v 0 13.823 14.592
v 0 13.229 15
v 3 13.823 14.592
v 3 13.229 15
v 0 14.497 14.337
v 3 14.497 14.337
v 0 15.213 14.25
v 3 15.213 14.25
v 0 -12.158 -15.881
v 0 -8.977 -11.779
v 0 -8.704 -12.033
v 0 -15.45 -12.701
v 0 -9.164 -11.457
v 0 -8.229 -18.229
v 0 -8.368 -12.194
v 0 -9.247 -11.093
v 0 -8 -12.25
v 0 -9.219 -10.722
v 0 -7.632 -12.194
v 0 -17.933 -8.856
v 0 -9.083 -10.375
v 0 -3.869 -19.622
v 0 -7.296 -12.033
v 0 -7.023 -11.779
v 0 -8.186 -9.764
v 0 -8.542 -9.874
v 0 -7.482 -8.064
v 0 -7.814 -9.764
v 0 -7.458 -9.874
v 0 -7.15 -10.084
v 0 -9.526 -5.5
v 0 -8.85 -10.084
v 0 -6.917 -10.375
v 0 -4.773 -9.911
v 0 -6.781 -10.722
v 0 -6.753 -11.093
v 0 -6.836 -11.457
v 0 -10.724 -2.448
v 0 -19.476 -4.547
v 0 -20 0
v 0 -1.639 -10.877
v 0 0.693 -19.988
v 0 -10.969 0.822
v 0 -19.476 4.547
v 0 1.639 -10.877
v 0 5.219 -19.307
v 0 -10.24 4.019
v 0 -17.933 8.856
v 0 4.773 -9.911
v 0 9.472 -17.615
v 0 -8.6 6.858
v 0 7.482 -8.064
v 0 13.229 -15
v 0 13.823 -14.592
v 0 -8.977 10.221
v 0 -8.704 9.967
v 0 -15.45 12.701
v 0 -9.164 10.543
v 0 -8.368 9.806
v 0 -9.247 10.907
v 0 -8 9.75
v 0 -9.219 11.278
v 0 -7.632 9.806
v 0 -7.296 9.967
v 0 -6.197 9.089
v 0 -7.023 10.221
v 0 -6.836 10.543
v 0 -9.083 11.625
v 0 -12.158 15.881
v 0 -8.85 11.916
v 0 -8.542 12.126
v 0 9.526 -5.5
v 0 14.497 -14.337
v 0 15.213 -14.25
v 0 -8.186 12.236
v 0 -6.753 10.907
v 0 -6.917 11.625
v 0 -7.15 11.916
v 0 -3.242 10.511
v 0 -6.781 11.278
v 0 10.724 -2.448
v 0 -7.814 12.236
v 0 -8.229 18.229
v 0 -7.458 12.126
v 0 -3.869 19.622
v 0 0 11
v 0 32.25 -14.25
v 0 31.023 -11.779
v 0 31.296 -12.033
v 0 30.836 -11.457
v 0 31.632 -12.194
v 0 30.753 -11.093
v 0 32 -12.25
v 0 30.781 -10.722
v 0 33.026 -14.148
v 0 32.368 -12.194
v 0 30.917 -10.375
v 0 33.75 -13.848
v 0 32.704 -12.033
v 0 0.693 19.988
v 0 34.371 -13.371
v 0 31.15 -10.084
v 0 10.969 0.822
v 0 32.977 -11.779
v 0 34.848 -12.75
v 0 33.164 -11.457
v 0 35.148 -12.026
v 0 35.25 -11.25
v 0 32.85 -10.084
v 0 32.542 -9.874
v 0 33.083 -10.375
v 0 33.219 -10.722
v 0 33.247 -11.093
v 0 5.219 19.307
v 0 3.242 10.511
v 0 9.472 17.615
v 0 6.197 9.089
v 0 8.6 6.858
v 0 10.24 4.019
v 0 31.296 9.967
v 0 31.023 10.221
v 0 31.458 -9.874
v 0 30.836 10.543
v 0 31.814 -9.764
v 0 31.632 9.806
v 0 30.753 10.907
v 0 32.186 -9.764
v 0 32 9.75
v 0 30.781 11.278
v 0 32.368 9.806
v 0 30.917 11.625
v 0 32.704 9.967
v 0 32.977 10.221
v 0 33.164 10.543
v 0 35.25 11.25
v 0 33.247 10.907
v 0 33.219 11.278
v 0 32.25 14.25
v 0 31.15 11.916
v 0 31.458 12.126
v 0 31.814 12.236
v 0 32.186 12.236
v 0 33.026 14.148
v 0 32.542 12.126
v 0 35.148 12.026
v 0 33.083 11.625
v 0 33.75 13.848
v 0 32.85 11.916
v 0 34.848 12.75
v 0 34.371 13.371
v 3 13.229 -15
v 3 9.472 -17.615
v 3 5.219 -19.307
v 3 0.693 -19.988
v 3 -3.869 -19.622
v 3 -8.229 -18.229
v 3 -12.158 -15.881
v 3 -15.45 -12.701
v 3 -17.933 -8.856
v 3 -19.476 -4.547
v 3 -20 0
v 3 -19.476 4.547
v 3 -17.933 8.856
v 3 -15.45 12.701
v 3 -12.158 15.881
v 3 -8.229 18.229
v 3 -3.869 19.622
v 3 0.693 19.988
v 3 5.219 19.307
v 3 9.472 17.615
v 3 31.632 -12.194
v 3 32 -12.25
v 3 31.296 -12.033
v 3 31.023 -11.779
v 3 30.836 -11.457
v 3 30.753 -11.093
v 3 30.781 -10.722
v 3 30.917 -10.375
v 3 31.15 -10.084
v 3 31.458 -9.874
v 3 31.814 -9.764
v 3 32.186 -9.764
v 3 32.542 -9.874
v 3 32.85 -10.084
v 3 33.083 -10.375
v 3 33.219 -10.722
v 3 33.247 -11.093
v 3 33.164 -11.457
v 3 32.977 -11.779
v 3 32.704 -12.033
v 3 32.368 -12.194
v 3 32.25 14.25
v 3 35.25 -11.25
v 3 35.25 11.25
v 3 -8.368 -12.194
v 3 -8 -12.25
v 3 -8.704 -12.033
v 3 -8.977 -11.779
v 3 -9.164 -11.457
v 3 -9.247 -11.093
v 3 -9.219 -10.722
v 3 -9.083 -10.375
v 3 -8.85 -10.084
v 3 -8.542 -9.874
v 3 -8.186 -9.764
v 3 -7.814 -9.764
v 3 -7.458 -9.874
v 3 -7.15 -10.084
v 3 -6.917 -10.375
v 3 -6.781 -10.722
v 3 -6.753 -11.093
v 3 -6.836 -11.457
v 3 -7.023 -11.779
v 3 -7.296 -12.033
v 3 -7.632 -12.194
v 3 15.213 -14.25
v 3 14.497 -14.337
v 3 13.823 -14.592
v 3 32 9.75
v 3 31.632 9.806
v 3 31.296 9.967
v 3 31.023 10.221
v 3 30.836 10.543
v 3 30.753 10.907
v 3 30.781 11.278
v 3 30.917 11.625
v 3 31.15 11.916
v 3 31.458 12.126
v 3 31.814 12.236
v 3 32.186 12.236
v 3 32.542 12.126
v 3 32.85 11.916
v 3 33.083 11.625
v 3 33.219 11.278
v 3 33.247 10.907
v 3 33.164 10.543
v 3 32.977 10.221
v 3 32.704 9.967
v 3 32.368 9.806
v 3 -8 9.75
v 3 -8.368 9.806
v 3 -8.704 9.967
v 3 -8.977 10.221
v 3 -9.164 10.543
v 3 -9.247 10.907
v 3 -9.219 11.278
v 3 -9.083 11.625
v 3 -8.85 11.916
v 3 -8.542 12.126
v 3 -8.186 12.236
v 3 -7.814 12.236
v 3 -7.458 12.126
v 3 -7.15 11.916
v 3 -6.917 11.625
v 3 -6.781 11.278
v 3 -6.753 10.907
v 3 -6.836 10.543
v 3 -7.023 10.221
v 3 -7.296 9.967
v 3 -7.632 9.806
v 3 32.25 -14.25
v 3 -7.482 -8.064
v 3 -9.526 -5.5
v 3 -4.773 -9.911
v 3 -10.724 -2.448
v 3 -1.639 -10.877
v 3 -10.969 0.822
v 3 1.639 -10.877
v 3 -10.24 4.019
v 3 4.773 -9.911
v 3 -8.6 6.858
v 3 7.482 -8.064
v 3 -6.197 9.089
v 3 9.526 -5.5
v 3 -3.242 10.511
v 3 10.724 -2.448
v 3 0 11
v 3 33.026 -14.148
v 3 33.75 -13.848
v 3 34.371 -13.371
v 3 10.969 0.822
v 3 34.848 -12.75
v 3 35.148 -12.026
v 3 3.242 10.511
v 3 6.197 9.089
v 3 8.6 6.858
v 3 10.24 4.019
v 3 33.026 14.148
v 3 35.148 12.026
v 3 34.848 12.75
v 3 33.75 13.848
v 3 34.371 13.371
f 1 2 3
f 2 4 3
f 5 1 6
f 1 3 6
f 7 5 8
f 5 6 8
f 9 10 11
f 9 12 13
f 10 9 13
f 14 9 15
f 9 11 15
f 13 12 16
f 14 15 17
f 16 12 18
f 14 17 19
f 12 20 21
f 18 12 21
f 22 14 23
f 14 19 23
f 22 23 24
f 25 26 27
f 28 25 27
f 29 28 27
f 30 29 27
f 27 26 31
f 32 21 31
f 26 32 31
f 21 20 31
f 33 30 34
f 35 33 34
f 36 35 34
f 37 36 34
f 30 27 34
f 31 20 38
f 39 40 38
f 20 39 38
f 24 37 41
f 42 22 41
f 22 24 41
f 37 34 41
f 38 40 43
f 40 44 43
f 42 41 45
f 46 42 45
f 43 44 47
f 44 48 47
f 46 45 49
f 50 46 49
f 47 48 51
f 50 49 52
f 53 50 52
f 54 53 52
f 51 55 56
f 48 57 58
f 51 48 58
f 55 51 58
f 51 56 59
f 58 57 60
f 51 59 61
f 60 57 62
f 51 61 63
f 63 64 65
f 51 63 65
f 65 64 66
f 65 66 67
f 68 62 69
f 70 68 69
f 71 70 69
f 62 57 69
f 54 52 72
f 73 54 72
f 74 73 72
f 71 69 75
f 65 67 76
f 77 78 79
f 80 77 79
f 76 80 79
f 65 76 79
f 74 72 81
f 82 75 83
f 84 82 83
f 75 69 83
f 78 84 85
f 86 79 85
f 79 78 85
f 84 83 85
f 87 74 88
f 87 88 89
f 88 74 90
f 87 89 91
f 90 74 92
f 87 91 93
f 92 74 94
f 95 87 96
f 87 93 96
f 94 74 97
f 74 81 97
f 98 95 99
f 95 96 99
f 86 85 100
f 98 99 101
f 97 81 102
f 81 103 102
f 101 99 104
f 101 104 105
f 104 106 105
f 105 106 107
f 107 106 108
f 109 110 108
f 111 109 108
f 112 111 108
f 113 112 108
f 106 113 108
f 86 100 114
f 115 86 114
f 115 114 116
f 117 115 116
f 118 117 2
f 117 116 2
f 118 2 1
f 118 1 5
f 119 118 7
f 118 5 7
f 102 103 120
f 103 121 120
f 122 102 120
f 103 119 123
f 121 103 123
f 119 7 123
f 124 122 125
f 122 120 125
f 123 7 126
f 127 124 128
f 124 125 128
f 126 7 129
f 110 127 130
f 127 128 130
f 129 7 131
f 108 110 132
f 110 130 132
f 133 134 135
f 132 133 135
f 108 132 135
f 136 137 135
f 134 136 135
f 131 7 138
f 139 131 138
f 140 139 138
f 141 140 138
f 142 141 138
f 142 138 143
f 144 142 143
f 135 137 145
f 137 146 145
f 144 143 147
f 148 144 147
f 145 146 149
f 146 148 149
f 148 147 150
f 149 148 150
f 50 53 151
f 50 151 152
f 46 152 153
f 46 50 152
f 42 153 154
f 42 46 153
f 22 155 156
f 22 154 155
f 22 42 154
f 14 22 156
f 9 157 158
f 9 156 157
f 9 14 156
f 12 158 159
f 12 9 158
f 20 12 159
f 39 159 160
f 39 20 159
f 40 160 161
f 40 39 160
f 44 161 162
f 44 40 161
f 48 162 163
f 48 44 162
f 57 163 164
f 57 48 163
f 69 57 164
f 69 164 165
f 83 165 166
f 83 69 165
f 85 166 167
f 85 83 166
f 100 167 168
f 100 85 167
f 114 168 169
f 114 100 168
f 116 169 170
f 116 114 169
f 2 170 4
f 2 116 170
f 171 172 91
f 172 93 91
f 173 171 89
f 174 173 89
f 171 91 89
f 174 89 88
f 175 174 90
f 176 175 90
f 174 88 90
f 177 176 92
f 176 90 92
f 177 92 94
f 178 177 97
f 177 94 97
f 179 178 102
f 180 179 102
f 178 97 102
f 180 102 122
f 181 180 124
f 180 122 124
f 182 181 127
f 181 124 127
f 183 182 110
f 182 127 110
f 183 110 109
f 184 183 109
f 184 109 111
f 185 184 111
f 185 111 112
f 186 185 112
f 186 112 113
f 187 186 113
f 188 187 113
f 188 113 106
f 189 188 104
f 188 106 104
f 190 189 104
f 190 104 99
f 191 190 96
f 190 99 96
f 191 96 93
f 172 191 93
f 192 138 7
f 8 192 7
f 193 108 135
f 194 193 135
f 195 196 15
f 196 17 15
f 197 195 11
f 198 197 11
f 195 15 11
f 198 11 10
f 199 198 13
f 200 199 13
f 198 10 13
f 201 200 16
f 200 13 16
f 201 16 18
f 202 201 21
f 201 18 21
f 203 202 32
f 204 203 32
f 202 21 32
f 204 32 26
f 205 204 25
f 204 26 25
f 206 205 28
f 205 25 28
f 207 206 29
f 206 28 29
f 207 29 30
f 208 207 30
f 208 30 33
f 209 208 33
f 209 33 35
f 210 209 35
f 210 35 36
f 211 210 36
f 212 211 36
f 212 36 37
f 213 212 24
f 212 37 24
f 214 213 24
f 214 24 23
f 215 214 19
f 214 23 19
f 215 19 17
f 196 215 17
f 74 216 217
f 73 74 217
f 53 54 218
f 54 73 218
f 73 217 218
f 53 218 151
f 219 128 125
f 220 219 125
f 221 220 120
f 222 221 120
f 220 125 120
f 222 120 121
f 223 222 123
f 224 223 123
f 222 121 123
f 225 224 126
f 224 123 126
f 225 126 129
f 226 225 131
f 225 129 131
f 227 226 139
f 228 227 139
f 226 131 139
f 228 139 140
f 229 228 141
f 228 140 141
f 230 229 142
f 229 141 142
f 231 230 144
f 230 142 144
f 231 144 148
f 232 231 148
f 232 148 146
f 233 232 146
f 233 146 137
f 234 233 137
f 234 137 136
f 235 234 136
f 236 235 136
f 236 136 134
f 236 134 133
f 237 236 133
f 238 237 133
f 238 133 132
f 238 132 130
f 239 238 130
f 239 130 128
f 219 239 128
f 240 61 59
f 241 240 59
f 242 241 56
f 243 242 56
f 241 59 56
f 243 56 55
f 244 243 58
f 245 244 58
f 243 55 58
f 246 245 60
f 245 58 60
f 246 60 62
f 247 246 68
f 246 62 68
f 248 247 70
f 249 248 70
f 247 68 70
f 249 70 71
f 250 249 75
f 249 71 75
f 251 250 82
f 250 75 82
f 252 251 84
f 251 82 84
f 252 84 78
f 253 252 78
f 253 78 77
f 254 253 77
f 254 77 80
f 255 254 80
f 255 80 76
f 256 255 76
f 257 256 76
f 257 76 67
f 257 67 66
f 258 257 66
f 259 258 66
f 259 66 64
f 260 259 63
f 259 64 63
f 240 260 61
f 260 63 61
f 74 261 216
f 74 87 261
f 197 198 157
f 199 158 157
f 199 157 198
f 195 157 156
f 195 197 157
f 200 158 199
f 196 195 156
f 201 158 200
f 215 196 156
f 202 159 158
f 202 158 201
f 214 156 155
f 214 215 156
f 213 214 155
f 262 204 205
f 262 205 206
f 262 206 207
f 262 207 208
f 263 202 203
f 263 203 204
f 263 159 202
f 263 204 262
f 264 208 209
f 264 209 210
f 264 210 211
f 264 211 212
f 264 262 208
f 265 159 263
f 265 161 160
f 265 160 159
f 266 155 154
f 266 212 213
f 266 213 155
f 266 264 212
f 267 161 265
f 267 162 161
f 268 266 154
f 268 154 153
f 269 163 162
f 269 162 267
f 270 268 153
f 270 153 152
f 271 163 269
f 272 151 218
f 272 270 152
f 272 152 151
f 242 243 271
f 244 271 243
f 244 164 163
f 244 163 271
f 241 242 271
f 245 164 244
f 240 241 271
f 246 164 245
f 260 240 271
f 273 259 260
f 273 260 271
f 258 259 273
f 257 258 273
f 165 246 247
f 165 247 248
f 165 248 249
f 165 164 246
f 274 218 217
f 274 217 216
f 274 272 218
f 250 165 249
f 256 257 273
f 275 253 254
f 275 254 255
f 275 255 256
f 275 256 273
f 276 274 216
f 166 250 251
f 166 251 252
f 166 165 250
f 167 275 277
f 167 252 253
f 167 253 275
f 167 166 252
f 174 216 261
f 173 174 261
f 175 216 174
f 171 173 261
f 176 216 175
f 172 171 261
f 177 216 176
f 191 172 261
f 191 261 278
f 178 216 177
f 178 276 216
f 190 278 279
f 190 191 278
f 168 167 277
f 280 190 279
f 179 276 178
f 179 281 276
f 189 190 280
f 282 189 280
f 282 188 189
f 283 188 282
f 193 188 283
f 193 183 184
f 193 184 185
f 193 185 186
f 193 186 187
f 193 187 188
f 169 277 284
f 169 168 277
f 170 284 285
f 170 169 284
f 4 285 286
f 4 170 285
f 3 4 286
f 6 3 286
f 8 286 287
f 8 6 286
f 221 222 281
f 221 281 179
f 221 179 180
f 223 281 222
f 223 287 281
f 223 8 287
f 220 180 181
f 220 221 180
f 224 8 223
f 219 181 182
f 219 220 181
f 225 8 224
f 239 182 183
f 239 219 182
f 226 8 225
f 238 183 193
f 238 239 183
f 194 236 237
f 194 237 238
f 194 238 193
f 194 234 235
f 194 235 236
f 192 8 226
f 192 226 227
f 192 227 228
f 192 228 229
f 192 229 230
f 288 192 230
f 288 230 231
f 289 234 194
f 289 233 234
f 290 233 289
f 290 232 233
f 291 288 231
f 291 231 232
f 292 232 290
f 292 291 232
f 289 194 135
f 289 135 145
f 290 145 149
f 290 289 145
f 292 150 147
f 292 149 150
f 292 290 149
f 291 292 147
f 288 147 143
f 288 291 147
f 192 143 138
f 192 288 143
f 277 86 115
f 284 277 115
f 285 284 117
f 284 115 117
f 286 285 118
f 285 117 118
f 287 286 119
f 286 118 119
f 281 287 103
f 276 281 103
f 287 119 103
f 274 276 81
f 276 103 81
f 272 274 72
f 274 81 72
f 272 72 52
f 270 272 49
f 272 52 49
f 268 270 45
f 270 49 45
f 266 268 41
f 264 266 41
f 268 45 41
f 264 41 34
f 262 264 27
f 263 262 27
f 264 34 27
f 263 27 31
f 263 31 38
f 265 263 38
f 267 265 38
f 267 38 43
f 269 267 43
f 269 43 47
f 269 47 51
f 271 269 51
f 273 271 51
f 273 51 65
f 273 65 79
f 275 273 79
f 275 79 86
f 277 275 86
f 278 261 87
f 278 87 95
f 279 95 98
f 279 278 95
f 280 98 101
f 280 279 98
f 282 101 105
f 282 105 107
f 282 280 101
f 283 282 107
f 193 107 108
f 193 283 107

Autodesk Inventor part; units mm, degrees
ref_plane "YZ Plane" through (0, 0, 0) normal (1, 0, 0) x (0, 1, 0)
ref_plane "XZ Plane" through (0, 0, 0) normal (0, 1, 0) x (-1, 0, 0)
ref_plane "XY Plane" through (0, 0, 0) normal (0, 0, 1) x (1, 0, 0)
sketch "スケッチ1" plane through (0, 0, 0) normal (1, 0, 0) x (0, 1, 0)
  circle A0 centre (0, 0) radius 20
  line L0 (0, 0) -> (35.25, 0)
  line L1 (35.25, 0) -> (35.25, -14.25)
  line L2 (35.25, -14.25) -> (0, -14.25)
  line L3 (0, -14.25) -> (0, 0)
  line L4 (35.25, 0) -> (35.25, 14.25)
  line L5 (35.25, 14.25) -> (0, 14.25)
  point P0 (14.0334, 14.25)
  point P1 (14.0334, -14.25)
  dimension "d0" = 40
  dimension "d1" = 14.25
  dimension "d2" = 35.25
extrude "押し出し1" add sketch "スケッチ1" along normal blind 3
sketch "スケッチ2" plane through (3, 0, 0) normal (1, 0, 0) x (0, 0, -1)
  line L0 (14.25, 35.25) -> (-14.25, 35.25) projected
  line L1 (-14.25, 35.25) -> (14.25, 35.25)
  line L2 (14.25, 35.25) -> (14.25, -11.25)
  line L3 (14.25, -11.25) -> (-14.25, -11.25)
  line L4 (-14.25, -11.25) -> (-14.25, 35.25)
  line L5 (-11, 32) -> (11, 32)
  line L6 (11, 32) -> (11, -8)
  line L7 (11, -8) -> (-11, -8)
  line L8 (-11, -8) -> (-11, 32)
  point P0 (0, 0)
  dimension "d5" = 46.5
  dimension "d6" = 3.25
  dimension "d7" = 3.25
  dimension "d8" = 3.25
  dimension "d9" = 3.25
hole "穴1" at (3, -8, 11) at (3, -8, -11) at (3, 32, -11) at (3, 32, 11) direction (-1, 0, 0) diameter 2.5 end through all
sketch "スケッチ3" plane through (0, 0, 0) normal (-1, 0, 0) x (0, 0, 1)
  circle A0 centre (0, 0) radius 11
  dimension "d17" = 22
extrude "押し出し2" cut sketch "スケッチ3" against normal blind 3
fillet "フィレット1" radius 3 4 edges at (1.5, 35.25, 14.25) (1.5, 14.0334, 14.25) (1.5, 35.25, -14.25) (1.5, 14.0334, -14.25)
properties part number "connectplate4" material "アルミニウム 6061"
